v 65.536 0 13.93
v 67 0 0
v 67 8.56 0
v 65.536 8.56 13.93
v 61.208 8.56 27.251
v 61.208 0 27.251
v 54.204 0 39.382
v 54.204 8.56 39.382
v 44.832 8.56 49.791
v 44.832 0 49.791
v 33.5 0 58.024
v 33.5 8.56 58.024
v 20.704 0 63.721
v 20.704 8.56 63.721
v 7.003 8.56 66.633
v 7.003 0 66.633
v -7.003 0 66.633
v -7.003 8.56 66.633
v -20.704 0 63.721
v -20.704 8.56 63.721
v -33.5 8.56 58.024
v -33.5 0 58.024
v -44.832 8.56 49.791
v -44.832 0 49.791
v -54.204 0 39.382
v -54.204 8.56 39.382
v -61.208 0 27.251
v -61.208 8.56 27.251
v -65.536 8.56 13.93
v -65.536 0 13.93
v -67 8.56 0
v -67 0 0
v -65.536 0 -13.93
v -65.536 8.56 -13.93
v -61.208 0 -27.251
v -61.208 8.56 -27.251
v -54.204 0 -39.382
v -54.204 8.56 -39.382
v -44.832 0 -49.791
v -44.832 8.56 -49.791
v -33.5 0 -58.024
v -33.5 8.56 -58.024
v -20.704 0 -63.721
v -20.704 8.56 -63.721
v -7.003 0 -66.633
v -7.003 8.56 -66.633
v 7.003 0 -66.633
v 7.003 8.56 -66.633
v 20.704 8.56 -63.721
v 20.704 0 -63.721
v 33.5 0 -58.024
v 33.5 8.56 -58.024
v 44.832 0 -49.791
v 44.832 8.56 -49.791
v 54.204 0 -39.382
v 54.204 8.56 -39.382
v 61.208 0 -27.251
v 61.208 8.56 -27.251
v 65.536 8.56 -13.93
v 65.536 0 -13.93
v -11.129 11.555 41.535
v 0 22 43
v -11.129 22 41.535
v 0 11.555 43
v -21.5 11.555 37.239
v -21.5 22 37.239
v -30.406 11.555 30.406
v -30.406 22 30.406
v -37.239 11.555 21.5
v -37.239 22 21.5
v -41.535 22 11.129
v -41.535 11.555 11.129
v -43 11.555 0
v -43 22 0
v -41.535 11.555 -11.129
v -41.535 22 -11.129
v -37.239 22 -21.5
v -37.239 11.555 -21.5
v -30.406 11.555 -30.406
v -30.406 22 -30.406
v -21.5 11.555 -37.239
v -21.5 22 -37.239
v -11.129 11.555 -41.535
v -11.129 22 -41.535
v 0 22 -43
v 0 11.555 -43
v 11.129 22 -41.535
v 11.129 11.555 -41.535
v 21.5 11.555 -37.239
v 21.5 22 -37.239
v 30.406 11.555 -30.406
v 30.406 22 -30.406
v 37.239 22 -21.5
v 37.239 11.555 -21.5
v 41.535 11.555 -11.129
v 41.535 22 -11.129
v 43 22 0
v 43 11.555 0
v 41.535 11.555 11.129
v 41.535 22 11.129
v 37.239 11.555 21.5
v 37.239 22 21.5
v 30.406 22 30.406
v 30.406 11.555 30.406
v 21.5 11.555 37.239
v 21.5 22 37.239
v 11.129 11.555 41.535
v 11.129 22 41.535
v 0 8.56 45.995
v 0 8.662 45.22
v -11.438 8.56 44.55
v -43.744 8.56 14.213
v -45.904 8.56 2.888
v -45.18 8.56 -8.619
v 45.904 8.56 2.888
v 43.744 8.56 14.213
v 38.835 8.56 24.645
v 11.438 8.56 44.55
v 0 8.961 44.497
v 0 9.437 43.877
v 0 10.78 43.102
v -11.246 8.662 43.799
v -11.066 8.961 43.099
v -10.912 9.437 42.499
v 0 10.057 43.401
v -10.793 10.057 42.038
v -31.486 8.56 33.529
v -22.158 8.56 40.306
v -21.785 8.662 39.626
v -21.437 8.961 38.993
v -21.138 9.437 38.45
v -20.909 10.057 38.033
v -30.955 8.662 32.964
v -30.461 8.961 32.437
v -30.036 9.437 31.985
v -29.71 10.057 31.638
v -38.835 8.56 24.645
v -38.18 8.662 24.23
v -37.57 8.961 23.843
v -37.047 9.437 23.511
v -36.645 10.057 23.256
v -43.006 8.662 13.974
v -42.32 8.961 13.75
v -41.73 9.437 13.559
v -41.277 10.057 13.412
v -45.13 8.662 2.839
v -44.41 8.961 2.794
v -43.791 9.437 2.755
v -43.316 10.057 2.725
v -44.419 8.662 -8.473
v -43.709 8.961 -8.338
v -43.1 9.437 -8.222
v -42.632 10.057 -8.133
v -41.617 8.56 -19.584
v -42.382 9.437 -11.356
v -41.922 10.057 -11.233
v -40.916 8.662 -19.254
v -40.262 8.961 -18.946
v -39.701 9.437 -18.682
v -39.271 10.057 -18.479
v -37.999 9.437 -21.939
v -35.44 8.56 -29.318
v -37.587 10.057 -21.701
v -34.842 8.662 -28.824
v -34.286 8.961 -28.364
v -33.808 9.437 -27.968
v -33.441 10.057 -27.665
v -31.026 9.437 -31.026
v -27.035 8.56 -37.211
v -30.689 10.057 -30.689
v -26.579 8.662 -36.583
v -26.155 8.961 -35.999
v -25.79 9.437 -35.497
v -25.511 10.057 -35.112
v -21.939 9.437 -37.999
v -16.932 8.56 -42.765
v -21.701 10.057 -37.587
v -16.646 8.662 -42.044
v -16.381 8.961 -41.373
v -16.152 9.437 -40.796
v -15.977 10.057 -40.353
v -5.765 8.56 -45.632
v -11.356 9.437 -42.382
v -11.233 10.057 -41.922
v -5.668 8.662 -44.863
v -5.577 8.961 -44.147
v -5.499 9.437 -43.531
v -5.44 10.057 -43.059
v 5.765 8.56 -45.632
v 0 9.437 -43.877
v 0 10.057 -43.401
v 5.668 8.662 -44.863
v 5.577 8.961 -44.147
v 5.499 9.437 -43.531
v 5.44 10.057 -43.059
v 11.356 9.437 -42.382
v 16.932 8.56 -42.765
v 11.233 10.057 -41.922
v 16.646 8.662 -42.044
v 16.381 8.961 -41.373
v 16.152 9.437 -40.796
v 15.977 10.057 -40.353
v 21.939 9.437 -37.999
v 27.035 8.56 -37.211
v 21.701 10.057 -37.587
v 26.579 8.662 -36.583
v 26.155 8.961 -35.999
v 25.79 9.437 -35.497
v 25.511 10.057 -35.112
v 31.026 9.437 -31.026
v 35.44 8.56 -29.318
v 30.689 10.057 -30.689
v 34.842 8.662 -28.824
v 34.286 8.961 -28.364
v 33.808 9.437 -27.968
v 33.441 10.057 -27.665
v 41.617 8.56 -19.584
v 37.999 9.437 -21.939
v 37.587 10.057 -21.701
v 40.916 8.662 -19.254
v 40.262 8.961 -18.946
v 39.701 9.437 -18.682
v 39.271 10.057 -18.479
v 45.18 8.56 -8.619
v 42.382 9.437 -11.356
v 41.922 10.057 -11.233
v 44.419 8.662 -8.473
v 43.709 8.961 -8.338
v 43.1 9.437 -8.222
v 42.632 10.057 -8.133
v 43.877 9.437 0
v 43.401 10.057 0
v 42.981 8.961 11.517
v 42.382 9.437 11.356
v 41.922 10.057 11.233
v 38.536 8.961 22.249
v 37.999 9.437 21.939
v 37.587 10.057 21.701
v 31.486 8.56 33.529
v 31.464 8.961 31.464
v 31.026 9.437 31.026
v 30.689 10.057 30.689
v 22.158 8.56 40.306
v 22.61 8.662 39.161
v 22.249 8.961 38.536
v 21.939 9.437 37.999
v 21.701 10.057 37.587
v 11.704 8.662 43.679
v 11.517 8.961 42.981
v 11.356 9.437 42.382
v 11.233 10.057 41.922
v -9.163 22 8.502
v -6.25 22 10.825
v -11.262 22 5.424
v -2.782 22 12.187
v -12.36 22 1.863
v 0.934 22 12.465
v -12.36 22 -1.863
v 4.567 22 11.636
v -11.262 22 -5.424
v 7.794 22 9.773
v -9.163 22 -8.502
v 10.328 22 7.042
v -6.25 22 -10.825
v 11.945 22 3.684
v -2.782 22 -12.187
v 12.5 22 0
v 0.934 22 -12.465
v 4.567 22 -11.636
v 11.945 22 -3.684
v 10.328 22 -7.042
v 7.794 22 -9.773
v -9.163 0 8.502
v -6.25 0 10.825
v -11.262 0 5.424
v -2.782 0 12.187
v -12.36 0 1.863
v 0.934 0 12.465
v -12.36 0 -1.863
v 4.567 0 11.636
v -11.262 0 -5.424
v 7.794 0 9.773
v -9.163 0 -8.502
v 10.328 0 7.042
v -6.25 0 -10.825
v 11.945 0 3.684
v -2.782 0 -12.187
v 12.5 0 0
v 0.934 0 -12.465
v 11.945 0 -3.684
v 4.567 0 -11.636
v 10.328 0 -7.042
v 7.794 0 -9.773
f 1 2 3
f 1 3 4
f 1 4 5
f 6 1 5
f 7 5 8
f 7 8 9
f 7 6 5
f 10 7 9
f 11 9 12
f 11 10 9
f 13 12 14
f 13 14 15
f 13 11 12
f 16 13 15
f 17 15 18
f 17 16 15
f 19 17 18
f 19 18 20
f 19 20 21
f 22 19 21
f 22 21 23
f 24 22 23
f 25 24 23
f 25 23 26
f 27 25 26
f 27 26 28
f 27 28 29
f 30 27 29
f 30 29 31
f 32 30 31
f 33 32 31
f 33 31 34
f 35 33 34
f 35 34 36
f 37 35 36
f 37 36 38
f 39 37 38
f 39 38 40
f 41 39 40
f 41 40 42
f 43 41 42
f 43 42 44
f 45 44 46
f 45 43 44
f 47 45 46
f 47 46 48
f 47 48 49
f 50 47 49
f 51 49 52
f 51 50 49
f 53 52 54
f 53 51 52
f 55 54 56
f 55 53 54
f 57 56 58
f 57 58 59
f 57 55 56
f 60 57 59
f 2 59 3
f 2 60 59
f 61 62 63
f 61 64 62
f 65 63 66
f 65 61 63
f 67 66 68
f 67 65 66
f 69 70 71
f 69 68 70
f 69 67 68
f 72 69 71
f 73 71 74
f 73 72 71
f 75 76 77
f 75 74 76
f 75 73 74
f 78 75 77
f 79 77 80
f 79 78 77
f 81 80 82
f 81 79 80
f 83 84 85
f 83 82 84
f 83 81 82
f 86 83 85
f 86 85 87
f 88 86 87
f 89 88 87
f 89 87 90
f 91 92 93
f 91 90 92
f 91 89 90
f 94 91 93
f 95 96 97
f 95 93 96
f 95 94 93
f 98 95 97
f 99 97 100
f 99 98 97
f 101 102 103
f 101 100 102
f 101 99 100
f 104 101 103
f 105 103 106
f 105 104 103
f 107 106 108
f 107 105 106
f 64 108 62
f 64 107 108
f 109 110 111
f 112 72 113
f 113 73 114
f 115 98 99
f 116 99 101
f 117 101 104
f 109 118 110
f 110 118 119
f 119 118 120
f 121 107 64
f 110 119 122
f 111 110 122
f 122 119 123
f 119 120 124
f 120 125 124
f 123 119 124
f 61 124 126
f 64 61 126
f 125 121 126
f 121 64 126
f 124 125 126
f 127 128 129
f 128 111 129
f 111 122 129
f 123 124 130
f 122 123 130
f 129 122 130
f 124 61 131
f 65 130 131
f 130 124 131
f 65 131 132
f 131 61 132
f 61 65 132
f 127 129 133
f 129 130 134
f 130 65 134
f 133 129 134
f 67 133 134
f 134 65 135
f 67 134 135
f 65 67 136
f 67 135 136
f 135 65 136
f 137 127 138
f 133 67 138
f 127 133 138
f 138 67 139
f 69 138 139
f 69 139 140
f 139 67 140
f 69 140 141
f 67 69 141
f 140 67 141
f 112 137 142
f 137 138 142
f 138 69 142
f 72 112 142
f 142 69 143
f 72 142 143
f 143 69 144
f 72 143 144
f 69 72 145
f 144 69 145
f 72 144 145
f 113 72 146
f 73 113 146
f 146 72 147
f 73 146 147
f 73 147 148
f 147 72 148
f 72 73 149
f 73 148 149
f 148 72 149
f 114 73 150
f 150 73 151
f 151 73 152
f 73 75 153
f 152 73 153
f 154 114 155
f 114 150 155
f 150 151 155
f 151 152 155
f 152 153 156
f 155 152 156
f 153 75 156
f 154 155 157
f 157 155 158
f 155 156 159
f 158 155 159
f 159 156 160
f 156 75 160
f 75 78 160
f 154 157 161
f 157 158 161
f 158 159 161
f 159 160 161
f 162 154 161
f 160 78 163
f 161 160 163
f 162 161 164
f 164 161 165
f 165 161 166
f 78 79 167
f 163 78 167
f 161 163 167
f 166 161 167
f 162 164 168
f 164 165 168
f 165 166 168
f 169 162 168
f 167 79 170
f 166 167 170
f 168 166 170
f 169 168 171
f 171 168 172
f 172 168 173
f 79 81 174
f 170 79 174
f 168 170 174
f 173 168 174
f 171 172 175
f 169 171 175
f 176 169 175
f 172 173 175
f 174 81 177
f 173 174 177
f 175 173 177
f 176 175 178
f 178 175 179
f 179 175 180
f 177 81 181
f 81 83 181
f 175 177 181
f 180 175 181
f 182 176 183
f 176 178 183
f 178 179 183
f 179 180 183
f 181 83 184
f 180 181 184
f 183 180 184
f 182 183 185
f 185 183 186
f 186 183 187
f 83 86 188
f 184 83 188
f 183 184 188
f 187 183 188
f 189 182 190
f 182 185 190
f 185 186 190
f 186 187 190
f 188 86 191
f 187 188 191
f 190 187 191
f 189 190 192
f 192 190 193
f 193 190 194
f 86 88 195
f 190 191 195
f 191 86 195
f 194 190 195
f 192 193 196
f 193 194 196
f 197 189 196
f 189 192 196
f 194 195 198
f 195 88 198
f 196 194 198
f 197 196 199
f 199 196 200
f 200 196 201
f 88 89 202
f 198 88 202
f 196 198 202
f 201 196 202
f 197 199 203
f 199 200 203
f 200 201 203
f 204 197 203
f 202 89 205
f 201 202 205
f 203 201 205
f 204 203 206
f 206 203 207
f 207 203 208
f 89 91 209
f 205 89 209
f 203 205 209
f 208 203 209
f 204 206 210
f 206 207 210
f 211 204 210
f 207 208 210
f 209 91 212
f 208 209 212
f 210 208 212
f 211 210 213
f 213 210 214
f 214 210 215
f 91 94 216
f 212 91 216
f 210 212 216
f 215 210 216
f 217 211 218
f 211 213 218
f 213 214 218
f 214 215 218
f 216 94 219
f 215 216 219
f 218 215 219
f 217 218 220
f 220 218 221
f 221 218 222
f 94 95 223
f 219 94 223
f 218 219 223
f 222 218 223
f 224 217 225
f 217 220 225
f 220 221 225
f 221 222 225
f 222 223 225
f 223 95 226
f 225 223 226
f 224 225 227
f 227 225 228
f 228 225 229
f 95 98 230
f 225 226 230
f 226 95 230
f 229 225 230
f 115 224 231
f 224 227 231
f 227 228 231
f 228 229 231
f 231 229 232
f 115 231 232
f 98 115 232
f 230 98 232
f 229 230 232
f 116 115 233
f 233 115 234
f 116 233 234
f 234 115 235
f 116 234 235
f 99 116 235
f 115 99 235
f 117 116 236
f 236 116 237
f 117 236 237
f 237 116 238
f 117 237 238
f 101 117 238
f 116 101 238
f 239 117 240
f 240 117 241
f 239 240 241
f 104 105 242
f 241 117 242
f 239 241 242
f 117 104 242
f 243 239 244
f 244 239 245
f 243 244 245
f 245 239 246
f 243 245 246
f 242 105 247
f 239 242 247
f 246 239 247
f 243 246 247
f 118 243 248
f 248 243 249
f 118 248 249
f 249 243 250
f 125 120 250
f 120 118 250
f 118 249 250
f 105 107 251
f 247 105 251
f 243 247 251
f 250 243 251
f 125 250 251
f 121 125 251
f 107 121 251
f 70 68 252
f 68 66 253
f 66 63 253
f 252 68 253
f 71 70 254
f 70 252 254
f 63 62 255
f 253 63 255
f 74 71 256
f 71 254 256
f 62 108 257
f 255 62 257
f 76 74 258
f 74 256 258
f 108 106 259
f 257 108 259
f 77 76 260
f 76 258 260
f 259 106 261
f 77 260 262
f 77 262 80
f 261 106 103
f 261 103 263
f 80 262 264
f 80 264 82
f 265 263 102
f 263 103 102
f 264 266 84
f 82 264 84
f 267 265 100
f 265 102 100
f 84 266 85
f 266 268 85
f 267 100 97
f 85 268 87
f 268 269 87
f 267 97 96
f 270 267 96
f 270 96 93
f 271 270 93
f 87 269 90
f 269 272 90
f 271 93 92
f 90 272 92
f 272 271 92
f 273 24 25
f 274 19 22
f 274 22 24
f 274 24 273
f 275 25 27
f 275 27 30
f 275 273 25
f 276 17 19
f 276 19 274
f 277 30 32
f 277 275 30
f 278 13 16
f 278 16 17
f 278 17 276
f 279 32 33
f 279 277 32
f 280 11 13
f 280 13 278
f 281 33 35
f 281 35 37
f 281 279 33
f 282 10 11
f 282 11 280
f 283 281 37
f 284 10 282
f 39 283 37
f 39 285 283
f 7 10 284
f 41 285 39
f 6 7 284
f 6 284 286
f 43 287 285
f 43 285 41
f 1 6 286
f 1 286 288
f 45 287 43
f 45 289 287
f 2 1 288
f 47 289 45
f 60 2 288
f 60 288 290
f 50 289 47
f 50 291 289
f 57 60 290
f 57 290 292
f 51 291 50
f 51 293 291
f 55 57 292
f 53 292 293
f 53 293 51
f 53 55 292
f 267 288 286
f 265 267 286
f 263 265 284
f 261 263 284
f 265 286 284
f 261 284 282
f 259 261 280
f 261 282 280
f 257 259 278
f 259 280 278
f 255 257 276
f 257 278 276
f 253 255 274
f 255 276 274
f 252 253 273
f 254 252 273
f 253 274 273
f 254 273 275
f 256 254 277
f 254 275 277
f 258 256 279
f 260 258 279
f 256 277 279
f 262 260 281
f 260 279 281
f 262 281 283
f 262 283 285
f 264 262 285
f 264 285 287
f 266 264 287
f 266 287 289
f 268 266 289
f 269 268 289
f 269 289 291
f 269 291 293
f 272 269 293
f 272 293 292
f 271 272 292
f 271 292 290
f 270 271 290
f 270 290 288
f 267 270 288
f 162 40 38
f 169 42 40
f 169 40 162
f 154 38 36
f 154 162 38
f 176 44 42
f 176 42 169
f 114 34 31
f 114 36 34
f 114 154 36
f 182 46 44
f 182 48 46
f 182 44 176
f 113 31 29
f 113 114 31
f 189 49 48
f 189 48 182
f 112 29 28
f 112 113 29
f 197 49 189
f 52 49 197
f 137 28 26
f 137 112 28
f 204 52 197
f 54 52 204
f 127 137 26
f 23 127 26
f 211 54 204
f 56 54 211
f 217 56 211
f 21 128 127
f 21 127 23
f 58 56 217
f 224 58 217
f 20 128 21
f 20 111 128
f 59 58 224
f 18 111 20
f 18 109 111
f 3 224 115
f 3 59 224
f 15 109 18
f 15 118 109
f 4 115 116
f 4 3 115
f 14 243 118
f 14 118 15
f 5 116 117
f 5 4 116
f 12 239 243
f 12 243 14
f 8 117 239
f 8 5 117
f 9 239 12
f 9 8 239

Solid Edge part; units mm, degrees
sketch "Sketch1" plane through (0, 0, 0) normal (0, -1, 0) x (1, 0, 0)
  circle A0 centre (0, 0) radius 67
extrude "Protrusion1" add sketch "Sketch1" against normal blind 22
sketch "Sketch2" plane through (0, 0, 0) normal (1, 0, 0) x (0, 1, 0)
  line L0 (8.56, 67) -> (8.56, 45.9948)
  arc A0 (8.56, 45.9948) -> (11.5548, 43) centre (11.5548, 45.9948) ccw
  line L1 (22, 43) -> (11.5548, 43)
  line L2 (22, 67) -> (22, 43)
  line L3 (8.56, 67) -> (22, 67)
  dimension "D1" = 8.56
revolve "RevolvedCutout1" cut sketch "Sketch2" angle 360 about axis through (0, 0, 0) along (0, 1, 0)
sketch "Sketch3" plane through (0, 0, 0) normal (0, -1, 0) x (1, 0, 0)
  circle A0 centre (0, 0) radius 12.5
extrude "ExtrudedCutout_1" cut sketch "Sketch3" against normal blind 22
